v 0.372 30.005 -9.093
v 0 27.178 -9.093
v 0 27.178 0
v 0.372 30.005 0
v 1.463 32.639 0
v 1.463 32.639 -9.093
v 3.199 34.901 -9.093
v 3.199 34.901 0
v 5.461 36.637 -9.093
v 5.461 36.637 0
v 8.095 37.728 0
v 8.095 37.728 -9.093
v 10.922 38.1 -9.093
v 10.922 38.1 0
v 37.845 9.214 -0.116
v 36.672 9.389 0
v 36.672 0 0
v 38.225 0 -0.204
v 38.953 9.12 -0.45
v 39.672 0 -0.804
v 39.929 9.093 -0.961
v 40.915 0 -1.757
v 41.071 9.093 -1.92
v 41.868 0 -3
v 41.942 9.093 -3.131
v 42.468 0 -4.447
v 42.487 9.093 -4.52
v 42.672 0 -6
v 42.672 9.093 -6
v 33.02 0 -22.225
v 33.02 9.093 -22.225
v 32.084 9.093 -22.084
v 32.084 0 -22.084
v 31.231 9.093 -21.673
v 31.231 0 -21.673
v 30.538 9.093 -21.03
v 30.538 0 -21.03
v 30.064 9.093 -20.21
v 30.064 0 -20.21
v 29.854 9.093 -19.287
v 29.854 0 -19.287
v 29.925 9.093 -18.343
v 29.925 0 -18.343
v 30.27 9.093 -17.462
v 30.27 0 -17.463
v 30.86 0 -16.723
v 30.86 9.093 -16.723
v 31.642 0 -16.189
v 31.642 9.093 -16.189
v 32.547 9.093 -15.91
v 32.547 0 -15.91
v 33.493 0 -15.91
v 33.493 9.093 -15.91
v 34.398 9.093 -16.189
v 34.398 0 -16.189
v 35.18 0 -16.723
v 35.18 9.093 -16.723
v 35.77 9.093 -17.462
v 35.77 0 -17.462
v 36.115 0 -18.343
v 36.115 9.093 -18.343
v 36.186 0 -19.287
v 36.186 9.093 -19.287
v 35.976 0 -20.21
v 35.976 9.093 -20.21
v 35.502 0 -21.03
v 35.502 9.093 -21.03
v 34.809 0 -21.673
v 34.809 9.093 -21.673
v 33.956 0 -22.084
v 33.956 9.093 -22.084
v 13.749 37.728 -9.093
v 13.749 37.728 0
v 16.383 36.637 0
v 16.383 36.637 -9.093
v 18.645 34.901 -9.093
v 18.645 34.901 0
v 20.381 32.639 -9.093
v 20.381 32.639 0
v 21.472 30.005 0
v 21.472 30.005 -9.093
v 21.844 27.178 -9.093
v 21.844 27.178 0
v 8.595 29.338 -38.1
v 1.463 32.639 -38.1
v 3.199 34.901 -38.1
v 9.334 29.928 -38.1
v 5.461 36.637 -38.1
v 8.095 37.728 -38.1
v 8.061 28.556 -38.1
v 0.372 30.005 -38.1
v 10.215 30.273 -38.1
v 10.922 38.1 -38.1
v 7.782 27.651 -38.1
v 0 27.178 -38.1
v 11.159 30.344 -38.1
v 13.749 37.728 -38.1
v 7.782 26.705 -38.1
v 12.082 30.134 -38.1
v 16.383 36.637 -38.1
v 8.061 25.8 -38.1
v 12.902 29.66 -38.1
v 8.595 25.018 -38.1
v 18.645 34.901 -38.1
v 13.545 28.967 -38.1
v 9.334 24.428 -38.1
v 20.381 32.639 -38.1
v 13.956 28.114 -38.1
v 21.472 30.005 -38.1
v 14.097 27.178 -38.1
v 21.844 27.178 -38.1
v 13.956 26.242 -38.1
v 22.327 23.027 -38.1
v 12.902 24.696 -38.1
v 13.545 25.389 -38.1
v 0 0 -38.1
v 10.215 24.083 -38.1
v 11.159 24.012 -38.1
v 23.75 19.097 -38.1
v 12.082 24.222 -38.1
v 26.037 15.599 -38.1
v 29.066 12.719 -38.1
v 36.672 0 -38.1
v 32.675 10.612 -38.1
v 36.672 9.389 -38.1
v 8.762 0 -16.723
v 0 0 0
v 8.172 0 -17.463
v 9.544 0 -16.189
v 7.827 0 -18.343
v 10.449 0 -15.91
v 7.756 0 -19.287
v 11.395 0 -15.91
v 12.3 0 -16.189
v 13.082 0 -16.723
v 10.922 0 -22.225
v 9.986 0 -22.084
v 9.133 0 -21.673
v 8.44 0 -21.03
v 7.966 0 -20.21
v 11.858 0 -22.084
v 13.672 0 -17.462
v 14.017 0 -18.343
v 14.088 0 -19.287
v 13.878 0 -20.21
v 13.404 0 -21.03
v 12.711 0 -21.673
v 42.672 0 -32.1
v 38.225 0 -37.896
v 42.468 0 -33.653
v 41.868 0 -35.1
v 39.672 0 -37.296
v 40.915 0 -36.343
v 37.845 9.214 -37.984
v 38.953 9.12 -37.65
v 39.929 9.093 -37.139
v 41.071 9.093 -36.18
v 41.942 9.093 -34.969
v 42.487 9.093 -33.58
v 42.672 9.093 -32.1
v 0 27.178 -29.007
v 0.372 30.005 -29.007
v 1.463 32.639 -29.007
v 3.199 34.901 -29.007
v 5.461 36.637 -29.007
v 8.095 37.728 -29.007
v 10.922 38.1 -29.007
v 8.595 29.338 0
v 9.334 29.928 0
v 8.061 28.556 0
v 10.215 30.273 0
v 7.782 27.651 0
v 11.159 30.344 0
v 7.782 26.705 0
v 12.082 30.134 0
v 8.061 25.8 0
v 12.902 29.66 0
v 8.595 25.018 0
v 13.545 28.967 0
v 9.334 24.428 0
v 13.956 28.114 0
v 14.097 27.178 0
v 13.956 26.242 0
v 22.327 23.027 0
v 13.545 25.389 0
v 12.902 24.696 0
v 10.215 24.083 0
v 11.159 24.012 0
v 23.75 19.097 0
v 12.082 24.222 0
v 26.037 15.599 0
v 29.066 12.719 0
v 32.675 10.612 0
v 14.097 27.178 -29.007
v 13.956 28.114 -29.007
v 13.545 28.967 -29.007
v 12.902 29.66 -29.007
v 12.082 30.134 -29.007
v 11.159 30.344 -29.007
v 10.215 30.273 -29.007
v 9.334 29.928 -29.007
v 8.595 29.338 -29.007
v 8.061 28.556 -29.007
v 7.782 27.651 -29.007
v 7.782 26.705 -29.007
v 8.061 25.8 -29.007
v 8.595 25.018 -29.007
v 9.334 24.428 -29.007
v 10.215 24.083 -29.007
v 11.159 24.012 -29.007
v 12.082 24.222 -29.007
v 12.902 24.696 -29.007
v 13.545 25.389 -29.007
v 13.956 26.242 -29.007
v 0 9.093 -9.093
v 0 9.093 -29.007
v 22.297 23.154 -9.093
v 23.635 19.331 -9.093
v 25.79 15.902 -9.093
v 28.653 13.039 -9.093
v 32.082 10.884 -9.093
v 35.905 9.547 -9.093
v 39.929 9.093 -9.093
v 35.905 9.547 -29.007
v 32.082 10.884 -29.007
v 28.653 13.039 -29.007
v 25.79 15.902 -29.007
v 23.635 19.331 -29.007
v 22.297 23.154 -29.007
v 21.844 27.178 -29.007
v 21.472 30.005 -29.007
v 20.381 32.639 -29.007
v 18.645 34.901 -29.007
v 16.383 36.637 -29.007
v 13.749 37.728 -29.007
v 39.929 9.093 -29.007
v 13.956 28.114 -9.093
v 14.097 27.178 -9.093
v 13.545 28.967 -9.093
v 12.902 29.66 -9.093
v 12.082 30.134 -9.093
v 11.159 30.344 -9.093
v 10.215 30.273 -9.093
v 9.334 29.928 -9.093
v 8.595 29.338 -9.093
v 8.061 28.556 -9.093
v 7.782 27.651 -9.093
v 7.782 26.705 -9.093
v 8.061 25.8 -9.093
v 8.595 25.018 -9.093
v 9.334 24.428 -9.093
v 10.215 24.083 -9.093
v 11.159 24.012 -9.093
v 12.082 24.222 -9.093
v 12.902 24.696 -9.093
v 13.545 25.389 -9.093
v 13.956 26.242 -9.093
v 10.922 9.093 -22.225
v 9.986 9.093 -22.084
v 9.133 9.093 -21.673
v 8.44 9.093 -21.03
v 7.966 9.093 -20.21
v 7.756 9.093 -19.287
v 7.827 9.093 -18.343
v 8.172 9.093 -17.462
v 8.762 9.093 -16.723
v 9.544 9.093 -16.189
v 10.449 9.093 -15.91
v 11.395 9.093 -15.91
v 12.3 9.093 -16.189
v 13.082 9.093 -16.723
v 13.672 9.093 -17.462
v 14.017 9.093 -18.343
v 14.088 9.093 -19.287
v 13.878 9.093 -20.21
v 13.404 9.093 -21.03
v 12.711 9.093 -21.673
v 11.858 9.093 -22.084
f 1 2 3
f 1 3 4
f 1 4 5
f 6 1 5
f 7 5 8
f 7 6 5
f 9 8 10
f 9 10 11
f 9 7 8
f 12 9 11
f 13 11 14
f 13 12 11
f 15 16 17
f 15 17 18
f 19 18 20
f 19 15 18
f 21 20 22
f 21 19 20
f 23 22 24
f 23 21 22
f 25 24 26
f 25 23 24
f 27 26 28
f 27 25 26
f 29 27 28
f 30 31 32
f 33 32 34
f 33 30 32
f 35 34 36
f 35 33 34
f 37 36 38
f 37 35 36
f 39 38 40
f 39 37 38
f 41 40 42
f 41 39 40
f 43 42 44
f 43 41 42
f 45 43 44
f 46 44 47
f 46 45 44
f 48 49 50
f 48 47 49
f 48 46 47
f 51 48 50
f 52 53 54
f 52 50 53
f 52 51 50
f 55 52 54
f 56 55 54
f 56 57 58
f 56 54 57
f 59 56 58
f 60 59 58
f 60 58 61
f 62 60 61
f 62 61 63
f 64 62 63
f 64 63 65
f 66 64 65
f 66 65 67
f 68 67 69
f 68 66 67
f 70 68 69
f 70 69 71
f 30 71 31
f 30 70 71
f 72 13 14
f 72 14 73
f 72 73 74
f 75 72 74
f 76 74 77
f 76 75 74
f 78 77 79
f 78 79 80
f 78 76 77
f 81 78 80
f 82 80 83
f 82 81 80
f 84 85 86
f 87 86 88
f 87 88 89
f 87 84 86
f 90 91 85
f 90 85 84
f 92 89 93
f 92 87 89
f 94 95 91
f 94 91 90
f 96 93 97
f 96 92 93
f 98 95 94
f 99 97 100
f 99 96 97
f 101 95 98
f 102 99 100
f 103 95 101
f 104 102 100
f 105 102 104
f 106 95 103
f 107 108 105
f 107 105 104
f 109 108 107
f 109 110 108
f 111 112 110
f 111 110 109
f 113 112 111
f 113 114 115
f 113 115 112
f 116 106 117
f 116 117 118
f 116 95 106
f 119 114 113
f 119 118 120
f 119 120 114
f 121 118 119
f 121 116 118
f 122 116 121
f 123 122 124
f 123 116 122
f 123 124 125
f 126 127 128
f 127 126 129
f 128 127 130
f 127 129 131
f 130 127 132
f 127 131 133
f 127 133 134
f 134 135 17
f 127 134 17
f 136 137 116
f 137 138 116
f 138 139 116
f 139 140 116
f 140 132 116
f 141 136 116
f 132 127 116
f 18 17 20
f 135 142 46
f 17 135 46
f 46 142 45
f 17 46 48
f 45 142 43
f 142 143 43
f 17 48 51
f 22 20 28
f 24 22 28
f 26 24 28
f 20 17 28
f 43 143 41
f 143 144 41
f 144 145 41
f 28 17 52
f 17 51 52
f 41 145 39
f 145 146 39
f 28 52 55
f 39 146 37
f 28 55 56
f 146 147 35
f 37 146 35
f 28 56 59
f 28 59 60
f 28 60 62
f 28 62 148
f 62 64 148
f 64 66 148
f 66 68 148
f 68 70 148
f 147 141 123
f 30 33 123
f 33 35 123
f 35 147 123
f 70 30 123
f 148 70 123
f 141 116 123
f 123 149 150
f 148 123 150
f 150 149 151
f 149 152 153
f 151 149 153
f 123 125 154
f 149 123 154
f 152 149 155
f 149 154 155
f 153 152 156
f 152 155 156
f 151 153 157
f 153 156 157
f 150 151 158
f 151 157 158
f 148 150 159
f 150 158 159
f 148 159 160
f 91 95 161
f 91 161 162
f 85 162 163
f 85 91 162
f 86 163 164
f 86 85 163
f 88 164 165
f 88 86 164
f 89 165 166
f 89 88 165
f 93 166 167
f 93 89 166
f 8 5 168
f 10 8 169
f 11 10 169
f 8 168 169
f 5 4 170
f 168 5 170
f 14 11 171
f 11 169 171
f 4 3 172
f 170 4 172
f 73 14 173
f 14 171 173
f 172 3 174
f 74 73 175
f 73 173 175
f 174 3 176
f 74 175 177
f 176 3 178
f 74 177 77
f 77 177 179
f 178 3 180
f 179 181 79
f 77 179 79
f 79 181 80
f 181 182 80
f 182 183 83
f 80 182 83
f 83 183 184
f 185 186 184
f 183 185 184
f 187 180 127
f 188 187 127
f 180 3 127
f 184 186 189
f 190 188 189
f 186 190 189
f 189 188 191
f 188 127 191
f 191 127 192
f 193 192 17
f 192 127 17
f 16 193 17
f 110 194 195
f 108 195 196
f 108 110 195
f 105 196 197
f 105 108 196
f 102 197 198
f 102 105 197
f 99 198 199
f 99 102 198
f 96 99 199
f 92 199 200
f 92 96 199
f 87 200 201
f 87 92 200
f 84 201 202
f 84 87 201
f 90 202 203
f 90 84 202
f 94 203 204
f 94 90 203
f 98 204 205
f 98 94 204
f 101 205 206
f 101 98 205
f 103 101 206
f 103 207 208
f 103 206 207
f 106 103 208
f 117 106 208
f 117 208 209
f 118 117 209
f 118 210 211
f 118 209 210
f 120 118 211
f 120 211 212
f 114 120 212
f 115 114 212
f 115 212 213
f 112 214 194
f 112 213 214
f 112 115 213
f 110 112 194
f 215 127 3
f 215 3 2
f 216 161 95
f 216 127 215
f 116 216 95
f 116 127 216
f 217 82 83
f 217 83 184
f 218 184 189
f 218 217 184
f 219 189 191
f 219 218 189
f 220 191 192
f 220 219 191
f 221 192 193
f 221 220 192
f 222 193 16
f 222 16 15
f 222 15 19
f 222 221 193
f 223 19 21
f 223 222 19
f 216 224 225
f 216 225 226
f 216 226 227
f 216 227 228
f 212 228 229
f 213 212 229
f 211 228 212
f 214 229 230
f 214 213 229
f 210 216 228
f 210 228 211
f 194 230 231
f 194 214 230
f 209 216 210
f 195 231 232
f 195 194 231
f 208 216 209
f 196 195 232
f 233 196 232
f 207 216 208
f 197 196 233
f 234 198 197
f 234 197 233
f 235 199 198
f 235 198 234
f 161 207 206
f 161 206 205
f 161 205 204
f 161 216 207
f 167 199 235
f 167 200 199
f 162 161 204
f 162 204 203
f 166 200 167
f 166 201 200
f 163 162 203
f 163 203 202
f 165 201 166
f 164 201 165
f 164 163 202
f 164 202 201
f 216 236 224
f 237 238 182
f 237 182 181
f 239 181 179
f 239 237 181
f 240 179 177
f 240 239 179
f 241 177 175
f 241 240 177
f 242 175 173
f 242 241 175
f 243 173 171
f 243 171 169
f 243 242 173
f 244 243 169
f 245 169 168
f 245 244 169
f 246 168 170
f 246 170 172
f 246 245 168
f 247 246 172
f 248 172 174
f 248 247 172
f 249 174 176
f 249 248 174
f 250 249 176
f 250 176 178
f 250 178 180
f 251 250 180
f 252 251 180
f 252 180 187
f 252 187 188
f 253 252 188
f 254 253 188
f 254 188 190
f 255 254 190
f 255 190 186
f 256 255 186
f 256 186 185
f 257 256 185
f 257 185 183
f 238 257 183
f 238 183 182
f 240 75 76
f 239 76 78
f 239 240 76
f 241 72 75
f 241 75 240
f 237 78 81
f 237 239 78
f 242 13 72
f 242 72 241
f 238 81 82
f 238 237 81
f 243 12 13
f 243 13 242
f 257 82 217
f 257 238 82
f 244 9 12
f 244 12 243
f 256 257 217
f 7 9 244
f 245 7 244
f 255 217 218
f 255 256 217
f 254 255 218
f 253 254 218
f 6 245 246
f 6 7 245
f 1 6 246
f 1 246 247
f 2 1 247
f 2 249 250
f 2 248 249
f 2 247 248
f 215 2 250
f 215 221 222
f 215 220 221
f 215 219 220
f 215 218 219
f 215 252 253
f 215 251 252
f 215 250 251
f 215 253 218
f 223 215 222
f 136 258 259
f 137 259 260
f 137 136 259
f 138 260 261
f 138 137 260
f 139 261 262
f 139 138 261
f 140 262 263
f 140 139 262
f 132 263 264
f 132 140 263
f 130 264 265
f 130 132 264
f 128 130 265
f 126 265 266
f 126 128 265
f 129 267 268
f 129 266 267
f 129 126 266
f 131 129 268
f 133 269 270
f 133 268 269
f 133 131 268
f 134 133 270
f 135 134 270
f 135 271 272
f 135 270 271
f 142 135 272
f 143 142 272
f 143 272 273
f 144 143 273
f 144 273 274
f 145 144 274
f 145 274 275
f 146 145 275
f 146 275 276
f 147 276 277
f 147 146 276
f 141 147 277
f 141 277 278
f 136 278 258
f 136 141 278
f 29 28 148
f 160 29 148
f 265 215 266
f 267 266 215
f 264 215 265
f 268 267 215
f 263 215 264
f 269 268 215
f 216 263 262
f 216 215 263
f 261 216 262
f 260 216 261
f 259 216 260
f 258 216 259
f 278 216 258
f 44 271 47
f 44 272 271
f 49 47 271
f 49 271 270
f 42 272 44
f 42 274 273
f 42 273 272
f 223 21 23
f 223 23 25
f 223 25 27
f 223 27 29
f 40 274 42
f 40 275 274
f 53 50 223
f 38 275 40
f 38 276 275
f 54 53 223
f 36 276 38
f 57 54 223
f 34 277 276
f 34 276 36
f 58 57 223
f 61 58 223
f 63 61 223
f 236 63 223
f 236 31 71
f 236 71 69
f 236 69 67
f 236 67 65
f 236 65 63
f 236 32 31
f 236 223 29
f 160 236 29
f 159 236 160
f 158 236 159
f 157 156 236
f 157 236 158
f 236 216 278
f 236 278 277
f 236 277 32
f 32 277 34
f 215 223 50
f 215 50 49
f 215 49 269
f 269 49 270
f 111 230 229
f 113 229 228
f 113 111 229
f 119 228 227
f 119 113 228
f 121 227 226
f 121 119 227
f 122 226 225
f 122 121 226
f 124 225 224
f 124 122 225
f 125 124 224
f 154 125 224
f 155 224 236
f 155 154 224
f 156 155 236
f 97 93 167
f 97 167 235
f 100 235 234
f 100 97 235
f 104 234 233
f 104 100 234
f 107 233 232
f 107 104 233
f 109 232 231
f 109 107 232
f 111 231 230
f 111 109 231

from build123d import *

# Parameters (mm, degrees)
SKETCH1_W              = 42.672
SKETCH1_H              = 38.1
BOSS_EXTRUDE1_DEPTH    = 38.1
SKETCH3_R              = 3.175
CUT_EXTRUDE1_DEPTH     = 69.732231042
FILLET1_R              = 6
SPLIT1_START           = -38.1
SPLIT1_OUTLINE_R       = 3.175
SPLIT1_DEPTH           = 38.1
SPLIT2_SURFACE_1_BACK  = 69.732
SPLIT2_SURFACE_1_DEPTH = 139.464


# Read off the part's stored shape, not the designer's step: Split1
with BuildPart() as part:
    # Sketch1 → Boss-Extrude1 (new body)
    with BuildSketch(Plane(origin=(0, 0, 0), x_dir=(1, 0, 0), z_dir=(0, 1, 0))):
        with Locations((21.336, 19.05)):
            Rectangle(SKETCH1_W, SKETCH1_H)
    extrude(amount=BOSS_EXTRUDE1_DEPTH)

    # Sketch3 → Cut-Extrude1 (cut, through all)
    with BuildSketch(Plane(origin=(0, 0, 0), x_dir=(1, 0, 0), z_dir=(0, 1, 0))):
        with Locations(Location((10.922, 19.05, 0), (0, 0, 90))):
            Circle(SKETCH3_R)
        with Locations(Location((33.02, 19.05, 0), (0, 0, 90))):
            Circle(SKETCH3_R)
    extrude(amount=CUT_EXTRUDE1_DEPTH, mode=Mode.SUBTRACT)

    # Fillet1
    fillet1_edges = [part.edges().sort_by_distance(p)[0] for p in [
        (42.672, 19.05, -38.1),
        (42.672, 19.05, 0),
    ]]
    fillet(fillet1_edges, radius=FILLET1_R)

    # Split1 outline → Split1 (cut)
    with BuildSketch(Plane.XY.offset(SPLIT1_START)):
        with Locations((10.922, 27.178)):
            Circle(SPLIT1_OUTLINE_R)
        with BuildLine():
            ThreePointArc((21.844, 27.178), (27.140915284, 14.390115284), (39.9288, 9.0932))
            Line((39.9288, 9.0932), (42.672, 9.0932))
            Line((42.672, 9.0932), (42.672, 38.1))
            Line((42.672, 38.1), (10.922, 38.1))
            ThreePointArc((10.922, 38.1), (18.645020264, 34.901020264), (21.844, 27.178))
        make_face()
        with BuildLine():
            ThreePointArc((0, 27.178), (3.198979736, 34.901020264), (10.922, 38.1))
            Line((10.922, 38.1), (0, 38.1))
            Line((0, 38.1), (0, 27.178))
        make_face()
    extrude(amount=SPLIT1_DEPTH, mode=Mode.SUBTRACT)

    # Split2: cut with a surface, the side behind it stays
    # Split2 surface: a surface, the sketch's curves swept straight by 139.464 mm
    with BuildLine(Plane(origin=(42.672, 0, 0), x_dir=(0, 0, -1), z_dir=(1, 0, 0)).offset(-SPLIT2_SURFACE_1_BACK), mode=Mode.PRIVATE) as split2_surface_1_path:
        Line((9.0932, 38.1), (9.0932, 9.0932))
        Line((9.0932, 9.0932), (29.0068, 9.0932))
        Line((29.0068, 9.0932), (29.0068, 38.1))
    split2_surface_1 = Shell.extrude(split2_surface_1_path.wire(), (1 * SPLIT2_SURFACE_1_DEPTH, 0 * SPLIT2_SURFACE_1_DEPTH, 0 * SPLIT2_SURFACE_1_DEPTH))
    split(bisect_by=split2_surface_1, keep=Keep.BOTTOM)


solid = part.part
